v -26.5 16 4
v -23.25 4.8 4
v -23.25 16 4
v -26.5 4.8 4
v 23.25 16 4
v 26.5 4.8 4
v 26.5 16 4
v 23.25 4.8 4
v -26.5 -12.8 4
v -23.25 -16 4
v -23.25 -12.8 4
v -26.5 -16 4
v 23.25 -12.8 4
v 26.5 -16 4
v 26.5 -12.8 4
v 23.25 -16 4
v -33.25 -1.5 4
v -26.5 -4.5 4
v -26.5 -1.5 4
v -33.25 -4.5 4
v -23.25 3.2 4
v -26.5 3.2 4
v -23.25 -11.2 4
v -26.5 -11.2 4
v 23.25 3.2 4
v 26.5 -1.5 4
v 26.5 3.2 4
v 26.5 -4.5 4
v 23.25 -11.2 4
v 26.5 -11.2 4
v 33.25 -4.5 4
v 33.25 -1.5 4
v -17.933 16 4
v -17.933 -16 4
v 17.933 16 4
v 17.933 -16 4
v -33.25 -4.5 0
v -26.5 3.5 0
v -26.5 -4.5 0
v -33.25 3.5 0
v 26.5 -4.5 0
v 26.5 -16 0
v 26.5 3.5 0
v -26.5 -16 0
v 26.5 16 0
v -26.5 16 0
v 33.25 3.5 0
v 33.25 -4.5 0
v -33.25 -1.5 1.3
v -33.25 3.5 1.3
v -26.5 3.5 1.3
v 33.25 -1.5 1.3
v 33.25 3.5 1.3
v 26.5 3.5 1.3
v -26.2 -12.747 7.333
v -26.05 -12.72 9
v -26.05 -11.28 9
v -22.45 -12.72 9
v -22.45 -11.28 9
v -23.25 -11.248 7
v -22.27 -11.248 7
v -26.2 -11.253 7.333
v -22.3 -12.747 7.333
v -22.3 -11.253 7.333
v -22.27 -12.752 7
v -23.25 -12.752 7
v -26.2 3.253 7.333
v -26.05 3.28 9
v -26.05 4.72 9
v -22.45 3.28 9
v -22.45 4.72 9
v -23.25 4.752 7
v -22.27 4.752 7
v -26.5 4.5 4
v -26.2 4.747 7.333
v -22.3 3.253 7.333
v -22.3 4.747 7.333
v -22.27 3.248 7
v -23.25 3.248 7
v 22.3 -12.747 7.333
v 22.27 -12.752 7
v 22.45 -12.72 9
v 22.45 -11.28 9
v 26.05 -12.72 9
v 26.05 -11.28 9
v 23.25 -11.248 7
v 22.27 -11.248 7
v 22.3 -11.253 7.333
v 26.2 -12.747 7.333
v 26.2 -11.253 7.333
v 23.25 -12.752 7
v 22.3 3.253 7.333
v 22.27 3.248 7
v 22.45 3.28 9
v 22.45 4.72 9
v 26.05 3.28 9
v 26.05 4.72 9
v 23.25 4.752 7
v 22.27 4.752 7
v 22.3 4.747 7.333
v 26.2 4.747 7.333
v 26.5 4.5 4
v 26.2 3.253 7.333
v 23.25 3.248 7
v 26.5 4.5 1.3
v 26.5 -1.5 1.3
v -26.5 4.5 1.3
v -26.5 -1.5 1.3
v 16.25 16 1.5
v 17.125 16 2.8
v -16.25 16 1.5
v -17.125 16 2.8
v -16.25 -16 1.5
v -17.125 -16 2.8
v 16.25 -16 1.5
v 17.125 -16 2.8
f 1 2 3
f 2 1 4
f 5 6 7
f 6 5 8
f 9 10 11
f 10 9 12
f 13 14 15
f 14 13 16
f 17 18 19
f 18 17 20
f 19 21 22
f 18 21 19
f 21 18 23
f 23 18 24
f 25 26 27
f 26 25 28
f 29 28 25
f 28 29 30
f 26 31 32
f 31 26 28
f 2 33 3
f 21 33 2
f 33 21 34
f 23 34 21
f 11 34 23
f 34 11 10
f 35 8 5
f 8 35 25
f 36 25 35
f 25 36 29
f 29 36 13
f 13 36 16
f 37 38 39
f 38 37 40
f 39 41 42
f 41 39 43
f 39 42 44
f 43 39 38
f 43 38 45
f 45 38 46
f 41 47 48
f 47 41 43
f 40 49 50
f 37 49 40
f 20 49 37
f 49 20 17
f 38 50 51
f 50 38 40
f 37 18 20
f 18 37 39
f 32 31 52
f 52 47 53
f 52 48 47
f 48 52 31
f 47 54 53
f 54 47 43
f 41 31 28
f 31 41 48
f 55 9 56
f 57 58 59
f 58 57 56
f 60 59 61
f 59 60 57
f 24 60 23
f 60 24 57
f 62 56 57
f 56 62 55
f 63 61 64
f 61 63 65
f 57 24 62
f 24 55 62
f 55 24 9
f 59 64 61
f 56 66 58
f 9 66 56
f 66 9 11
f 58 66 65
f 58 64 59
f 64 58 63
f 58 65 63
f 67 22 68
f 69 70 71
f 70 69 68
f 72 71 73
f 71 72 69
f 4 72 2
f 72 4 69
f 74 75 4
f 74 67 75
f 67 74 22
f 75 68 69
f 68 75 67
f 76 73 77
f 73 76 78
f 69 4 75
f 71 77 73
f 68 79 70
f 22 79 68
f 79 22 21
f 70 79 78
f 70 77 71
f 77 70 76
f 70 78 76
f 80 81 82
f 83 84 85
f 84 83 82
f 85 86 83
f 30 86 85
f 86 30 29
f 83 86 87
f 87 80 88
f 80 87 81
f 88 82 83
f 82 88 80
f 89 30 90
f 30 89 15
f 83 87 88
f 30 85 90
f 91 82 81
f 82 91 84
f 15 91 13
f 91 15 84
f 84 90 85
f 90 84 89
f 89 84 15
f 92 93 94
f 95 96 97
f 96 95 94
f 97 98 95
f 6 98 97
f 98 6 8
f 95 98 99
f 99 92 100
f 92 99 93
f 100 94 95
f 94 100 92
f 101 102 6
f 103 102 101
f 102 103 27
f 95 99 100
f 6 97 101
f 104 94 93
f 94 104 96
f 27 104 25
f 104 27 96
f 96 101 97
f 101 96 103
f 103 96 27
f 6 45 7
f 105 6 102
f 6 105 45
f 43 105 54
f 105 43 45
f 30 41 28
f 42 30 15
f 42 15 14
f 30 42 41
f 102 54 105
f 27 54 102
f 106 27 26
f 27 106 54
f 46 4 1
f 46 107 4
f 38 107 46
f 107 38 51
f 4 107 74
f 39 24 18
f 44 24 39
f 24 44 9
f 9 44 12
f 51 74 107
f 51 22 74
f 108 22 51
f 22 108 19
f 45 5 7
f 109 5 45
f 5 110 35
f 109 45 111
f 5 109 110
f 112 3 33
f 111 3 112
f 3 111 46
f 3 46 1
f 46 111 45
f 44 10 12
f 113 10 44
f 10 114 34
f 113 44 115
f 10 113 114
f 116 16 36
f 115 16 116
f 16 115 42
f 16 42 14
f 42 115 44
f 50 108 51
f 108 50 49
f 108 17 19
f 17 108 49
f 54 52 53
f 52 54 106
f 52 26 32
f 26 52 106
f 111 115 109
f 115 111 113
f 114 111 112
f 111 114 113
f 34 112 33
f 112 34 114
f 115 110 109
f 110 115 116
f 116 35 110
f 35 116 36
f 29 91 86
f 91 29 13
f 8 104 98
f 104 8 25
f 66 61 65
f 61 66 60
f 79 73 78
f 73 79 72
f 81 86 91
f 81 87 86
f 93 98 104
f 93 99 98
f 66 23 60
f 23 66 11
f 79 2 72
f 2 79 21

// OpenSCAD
// Holding clip for the MO5 Extension
// Copyright François Revol, 2025

// I didn't have the original part to model it,
// only the drawing from the user manual and the cases to measure.

optimize_fdm = true;

difference() {
    union() {
       translate([0,0,2]) cube([53.5-0.5,32,2+2], center=true);
        for (dx=[-1,1])
            translate([dx*(46.5+10)/2,-0.5,4/2]) cube([10,8,4], center=true);
        for (dx=[-1,1],dy=[-1,1]) {
            translate([dx*(46.5+3.5-1.5)/2,dy*8-4,4]) rotate([0,0,0]) linear_extrude(5, scale=[0.8,0.9]) square([4.5,1.6], center=true);
        }
    }
    translate([0,0,2-(optimize_fdm?0.5:0)]) linear_extrude(2.1+(optimize_fdm?0.5:0), scale=[36/32.5,1]) square([32.5,35], center=true);
    translate([0,0,2+2+3/2]) cube([46.5,35,3], center=true);
    for (dx=[-1,1])
        translate([dx*(46.5+10+6.5)/2,1.5,1.3+4/2]) cube([10,6,4], center=true);
}
